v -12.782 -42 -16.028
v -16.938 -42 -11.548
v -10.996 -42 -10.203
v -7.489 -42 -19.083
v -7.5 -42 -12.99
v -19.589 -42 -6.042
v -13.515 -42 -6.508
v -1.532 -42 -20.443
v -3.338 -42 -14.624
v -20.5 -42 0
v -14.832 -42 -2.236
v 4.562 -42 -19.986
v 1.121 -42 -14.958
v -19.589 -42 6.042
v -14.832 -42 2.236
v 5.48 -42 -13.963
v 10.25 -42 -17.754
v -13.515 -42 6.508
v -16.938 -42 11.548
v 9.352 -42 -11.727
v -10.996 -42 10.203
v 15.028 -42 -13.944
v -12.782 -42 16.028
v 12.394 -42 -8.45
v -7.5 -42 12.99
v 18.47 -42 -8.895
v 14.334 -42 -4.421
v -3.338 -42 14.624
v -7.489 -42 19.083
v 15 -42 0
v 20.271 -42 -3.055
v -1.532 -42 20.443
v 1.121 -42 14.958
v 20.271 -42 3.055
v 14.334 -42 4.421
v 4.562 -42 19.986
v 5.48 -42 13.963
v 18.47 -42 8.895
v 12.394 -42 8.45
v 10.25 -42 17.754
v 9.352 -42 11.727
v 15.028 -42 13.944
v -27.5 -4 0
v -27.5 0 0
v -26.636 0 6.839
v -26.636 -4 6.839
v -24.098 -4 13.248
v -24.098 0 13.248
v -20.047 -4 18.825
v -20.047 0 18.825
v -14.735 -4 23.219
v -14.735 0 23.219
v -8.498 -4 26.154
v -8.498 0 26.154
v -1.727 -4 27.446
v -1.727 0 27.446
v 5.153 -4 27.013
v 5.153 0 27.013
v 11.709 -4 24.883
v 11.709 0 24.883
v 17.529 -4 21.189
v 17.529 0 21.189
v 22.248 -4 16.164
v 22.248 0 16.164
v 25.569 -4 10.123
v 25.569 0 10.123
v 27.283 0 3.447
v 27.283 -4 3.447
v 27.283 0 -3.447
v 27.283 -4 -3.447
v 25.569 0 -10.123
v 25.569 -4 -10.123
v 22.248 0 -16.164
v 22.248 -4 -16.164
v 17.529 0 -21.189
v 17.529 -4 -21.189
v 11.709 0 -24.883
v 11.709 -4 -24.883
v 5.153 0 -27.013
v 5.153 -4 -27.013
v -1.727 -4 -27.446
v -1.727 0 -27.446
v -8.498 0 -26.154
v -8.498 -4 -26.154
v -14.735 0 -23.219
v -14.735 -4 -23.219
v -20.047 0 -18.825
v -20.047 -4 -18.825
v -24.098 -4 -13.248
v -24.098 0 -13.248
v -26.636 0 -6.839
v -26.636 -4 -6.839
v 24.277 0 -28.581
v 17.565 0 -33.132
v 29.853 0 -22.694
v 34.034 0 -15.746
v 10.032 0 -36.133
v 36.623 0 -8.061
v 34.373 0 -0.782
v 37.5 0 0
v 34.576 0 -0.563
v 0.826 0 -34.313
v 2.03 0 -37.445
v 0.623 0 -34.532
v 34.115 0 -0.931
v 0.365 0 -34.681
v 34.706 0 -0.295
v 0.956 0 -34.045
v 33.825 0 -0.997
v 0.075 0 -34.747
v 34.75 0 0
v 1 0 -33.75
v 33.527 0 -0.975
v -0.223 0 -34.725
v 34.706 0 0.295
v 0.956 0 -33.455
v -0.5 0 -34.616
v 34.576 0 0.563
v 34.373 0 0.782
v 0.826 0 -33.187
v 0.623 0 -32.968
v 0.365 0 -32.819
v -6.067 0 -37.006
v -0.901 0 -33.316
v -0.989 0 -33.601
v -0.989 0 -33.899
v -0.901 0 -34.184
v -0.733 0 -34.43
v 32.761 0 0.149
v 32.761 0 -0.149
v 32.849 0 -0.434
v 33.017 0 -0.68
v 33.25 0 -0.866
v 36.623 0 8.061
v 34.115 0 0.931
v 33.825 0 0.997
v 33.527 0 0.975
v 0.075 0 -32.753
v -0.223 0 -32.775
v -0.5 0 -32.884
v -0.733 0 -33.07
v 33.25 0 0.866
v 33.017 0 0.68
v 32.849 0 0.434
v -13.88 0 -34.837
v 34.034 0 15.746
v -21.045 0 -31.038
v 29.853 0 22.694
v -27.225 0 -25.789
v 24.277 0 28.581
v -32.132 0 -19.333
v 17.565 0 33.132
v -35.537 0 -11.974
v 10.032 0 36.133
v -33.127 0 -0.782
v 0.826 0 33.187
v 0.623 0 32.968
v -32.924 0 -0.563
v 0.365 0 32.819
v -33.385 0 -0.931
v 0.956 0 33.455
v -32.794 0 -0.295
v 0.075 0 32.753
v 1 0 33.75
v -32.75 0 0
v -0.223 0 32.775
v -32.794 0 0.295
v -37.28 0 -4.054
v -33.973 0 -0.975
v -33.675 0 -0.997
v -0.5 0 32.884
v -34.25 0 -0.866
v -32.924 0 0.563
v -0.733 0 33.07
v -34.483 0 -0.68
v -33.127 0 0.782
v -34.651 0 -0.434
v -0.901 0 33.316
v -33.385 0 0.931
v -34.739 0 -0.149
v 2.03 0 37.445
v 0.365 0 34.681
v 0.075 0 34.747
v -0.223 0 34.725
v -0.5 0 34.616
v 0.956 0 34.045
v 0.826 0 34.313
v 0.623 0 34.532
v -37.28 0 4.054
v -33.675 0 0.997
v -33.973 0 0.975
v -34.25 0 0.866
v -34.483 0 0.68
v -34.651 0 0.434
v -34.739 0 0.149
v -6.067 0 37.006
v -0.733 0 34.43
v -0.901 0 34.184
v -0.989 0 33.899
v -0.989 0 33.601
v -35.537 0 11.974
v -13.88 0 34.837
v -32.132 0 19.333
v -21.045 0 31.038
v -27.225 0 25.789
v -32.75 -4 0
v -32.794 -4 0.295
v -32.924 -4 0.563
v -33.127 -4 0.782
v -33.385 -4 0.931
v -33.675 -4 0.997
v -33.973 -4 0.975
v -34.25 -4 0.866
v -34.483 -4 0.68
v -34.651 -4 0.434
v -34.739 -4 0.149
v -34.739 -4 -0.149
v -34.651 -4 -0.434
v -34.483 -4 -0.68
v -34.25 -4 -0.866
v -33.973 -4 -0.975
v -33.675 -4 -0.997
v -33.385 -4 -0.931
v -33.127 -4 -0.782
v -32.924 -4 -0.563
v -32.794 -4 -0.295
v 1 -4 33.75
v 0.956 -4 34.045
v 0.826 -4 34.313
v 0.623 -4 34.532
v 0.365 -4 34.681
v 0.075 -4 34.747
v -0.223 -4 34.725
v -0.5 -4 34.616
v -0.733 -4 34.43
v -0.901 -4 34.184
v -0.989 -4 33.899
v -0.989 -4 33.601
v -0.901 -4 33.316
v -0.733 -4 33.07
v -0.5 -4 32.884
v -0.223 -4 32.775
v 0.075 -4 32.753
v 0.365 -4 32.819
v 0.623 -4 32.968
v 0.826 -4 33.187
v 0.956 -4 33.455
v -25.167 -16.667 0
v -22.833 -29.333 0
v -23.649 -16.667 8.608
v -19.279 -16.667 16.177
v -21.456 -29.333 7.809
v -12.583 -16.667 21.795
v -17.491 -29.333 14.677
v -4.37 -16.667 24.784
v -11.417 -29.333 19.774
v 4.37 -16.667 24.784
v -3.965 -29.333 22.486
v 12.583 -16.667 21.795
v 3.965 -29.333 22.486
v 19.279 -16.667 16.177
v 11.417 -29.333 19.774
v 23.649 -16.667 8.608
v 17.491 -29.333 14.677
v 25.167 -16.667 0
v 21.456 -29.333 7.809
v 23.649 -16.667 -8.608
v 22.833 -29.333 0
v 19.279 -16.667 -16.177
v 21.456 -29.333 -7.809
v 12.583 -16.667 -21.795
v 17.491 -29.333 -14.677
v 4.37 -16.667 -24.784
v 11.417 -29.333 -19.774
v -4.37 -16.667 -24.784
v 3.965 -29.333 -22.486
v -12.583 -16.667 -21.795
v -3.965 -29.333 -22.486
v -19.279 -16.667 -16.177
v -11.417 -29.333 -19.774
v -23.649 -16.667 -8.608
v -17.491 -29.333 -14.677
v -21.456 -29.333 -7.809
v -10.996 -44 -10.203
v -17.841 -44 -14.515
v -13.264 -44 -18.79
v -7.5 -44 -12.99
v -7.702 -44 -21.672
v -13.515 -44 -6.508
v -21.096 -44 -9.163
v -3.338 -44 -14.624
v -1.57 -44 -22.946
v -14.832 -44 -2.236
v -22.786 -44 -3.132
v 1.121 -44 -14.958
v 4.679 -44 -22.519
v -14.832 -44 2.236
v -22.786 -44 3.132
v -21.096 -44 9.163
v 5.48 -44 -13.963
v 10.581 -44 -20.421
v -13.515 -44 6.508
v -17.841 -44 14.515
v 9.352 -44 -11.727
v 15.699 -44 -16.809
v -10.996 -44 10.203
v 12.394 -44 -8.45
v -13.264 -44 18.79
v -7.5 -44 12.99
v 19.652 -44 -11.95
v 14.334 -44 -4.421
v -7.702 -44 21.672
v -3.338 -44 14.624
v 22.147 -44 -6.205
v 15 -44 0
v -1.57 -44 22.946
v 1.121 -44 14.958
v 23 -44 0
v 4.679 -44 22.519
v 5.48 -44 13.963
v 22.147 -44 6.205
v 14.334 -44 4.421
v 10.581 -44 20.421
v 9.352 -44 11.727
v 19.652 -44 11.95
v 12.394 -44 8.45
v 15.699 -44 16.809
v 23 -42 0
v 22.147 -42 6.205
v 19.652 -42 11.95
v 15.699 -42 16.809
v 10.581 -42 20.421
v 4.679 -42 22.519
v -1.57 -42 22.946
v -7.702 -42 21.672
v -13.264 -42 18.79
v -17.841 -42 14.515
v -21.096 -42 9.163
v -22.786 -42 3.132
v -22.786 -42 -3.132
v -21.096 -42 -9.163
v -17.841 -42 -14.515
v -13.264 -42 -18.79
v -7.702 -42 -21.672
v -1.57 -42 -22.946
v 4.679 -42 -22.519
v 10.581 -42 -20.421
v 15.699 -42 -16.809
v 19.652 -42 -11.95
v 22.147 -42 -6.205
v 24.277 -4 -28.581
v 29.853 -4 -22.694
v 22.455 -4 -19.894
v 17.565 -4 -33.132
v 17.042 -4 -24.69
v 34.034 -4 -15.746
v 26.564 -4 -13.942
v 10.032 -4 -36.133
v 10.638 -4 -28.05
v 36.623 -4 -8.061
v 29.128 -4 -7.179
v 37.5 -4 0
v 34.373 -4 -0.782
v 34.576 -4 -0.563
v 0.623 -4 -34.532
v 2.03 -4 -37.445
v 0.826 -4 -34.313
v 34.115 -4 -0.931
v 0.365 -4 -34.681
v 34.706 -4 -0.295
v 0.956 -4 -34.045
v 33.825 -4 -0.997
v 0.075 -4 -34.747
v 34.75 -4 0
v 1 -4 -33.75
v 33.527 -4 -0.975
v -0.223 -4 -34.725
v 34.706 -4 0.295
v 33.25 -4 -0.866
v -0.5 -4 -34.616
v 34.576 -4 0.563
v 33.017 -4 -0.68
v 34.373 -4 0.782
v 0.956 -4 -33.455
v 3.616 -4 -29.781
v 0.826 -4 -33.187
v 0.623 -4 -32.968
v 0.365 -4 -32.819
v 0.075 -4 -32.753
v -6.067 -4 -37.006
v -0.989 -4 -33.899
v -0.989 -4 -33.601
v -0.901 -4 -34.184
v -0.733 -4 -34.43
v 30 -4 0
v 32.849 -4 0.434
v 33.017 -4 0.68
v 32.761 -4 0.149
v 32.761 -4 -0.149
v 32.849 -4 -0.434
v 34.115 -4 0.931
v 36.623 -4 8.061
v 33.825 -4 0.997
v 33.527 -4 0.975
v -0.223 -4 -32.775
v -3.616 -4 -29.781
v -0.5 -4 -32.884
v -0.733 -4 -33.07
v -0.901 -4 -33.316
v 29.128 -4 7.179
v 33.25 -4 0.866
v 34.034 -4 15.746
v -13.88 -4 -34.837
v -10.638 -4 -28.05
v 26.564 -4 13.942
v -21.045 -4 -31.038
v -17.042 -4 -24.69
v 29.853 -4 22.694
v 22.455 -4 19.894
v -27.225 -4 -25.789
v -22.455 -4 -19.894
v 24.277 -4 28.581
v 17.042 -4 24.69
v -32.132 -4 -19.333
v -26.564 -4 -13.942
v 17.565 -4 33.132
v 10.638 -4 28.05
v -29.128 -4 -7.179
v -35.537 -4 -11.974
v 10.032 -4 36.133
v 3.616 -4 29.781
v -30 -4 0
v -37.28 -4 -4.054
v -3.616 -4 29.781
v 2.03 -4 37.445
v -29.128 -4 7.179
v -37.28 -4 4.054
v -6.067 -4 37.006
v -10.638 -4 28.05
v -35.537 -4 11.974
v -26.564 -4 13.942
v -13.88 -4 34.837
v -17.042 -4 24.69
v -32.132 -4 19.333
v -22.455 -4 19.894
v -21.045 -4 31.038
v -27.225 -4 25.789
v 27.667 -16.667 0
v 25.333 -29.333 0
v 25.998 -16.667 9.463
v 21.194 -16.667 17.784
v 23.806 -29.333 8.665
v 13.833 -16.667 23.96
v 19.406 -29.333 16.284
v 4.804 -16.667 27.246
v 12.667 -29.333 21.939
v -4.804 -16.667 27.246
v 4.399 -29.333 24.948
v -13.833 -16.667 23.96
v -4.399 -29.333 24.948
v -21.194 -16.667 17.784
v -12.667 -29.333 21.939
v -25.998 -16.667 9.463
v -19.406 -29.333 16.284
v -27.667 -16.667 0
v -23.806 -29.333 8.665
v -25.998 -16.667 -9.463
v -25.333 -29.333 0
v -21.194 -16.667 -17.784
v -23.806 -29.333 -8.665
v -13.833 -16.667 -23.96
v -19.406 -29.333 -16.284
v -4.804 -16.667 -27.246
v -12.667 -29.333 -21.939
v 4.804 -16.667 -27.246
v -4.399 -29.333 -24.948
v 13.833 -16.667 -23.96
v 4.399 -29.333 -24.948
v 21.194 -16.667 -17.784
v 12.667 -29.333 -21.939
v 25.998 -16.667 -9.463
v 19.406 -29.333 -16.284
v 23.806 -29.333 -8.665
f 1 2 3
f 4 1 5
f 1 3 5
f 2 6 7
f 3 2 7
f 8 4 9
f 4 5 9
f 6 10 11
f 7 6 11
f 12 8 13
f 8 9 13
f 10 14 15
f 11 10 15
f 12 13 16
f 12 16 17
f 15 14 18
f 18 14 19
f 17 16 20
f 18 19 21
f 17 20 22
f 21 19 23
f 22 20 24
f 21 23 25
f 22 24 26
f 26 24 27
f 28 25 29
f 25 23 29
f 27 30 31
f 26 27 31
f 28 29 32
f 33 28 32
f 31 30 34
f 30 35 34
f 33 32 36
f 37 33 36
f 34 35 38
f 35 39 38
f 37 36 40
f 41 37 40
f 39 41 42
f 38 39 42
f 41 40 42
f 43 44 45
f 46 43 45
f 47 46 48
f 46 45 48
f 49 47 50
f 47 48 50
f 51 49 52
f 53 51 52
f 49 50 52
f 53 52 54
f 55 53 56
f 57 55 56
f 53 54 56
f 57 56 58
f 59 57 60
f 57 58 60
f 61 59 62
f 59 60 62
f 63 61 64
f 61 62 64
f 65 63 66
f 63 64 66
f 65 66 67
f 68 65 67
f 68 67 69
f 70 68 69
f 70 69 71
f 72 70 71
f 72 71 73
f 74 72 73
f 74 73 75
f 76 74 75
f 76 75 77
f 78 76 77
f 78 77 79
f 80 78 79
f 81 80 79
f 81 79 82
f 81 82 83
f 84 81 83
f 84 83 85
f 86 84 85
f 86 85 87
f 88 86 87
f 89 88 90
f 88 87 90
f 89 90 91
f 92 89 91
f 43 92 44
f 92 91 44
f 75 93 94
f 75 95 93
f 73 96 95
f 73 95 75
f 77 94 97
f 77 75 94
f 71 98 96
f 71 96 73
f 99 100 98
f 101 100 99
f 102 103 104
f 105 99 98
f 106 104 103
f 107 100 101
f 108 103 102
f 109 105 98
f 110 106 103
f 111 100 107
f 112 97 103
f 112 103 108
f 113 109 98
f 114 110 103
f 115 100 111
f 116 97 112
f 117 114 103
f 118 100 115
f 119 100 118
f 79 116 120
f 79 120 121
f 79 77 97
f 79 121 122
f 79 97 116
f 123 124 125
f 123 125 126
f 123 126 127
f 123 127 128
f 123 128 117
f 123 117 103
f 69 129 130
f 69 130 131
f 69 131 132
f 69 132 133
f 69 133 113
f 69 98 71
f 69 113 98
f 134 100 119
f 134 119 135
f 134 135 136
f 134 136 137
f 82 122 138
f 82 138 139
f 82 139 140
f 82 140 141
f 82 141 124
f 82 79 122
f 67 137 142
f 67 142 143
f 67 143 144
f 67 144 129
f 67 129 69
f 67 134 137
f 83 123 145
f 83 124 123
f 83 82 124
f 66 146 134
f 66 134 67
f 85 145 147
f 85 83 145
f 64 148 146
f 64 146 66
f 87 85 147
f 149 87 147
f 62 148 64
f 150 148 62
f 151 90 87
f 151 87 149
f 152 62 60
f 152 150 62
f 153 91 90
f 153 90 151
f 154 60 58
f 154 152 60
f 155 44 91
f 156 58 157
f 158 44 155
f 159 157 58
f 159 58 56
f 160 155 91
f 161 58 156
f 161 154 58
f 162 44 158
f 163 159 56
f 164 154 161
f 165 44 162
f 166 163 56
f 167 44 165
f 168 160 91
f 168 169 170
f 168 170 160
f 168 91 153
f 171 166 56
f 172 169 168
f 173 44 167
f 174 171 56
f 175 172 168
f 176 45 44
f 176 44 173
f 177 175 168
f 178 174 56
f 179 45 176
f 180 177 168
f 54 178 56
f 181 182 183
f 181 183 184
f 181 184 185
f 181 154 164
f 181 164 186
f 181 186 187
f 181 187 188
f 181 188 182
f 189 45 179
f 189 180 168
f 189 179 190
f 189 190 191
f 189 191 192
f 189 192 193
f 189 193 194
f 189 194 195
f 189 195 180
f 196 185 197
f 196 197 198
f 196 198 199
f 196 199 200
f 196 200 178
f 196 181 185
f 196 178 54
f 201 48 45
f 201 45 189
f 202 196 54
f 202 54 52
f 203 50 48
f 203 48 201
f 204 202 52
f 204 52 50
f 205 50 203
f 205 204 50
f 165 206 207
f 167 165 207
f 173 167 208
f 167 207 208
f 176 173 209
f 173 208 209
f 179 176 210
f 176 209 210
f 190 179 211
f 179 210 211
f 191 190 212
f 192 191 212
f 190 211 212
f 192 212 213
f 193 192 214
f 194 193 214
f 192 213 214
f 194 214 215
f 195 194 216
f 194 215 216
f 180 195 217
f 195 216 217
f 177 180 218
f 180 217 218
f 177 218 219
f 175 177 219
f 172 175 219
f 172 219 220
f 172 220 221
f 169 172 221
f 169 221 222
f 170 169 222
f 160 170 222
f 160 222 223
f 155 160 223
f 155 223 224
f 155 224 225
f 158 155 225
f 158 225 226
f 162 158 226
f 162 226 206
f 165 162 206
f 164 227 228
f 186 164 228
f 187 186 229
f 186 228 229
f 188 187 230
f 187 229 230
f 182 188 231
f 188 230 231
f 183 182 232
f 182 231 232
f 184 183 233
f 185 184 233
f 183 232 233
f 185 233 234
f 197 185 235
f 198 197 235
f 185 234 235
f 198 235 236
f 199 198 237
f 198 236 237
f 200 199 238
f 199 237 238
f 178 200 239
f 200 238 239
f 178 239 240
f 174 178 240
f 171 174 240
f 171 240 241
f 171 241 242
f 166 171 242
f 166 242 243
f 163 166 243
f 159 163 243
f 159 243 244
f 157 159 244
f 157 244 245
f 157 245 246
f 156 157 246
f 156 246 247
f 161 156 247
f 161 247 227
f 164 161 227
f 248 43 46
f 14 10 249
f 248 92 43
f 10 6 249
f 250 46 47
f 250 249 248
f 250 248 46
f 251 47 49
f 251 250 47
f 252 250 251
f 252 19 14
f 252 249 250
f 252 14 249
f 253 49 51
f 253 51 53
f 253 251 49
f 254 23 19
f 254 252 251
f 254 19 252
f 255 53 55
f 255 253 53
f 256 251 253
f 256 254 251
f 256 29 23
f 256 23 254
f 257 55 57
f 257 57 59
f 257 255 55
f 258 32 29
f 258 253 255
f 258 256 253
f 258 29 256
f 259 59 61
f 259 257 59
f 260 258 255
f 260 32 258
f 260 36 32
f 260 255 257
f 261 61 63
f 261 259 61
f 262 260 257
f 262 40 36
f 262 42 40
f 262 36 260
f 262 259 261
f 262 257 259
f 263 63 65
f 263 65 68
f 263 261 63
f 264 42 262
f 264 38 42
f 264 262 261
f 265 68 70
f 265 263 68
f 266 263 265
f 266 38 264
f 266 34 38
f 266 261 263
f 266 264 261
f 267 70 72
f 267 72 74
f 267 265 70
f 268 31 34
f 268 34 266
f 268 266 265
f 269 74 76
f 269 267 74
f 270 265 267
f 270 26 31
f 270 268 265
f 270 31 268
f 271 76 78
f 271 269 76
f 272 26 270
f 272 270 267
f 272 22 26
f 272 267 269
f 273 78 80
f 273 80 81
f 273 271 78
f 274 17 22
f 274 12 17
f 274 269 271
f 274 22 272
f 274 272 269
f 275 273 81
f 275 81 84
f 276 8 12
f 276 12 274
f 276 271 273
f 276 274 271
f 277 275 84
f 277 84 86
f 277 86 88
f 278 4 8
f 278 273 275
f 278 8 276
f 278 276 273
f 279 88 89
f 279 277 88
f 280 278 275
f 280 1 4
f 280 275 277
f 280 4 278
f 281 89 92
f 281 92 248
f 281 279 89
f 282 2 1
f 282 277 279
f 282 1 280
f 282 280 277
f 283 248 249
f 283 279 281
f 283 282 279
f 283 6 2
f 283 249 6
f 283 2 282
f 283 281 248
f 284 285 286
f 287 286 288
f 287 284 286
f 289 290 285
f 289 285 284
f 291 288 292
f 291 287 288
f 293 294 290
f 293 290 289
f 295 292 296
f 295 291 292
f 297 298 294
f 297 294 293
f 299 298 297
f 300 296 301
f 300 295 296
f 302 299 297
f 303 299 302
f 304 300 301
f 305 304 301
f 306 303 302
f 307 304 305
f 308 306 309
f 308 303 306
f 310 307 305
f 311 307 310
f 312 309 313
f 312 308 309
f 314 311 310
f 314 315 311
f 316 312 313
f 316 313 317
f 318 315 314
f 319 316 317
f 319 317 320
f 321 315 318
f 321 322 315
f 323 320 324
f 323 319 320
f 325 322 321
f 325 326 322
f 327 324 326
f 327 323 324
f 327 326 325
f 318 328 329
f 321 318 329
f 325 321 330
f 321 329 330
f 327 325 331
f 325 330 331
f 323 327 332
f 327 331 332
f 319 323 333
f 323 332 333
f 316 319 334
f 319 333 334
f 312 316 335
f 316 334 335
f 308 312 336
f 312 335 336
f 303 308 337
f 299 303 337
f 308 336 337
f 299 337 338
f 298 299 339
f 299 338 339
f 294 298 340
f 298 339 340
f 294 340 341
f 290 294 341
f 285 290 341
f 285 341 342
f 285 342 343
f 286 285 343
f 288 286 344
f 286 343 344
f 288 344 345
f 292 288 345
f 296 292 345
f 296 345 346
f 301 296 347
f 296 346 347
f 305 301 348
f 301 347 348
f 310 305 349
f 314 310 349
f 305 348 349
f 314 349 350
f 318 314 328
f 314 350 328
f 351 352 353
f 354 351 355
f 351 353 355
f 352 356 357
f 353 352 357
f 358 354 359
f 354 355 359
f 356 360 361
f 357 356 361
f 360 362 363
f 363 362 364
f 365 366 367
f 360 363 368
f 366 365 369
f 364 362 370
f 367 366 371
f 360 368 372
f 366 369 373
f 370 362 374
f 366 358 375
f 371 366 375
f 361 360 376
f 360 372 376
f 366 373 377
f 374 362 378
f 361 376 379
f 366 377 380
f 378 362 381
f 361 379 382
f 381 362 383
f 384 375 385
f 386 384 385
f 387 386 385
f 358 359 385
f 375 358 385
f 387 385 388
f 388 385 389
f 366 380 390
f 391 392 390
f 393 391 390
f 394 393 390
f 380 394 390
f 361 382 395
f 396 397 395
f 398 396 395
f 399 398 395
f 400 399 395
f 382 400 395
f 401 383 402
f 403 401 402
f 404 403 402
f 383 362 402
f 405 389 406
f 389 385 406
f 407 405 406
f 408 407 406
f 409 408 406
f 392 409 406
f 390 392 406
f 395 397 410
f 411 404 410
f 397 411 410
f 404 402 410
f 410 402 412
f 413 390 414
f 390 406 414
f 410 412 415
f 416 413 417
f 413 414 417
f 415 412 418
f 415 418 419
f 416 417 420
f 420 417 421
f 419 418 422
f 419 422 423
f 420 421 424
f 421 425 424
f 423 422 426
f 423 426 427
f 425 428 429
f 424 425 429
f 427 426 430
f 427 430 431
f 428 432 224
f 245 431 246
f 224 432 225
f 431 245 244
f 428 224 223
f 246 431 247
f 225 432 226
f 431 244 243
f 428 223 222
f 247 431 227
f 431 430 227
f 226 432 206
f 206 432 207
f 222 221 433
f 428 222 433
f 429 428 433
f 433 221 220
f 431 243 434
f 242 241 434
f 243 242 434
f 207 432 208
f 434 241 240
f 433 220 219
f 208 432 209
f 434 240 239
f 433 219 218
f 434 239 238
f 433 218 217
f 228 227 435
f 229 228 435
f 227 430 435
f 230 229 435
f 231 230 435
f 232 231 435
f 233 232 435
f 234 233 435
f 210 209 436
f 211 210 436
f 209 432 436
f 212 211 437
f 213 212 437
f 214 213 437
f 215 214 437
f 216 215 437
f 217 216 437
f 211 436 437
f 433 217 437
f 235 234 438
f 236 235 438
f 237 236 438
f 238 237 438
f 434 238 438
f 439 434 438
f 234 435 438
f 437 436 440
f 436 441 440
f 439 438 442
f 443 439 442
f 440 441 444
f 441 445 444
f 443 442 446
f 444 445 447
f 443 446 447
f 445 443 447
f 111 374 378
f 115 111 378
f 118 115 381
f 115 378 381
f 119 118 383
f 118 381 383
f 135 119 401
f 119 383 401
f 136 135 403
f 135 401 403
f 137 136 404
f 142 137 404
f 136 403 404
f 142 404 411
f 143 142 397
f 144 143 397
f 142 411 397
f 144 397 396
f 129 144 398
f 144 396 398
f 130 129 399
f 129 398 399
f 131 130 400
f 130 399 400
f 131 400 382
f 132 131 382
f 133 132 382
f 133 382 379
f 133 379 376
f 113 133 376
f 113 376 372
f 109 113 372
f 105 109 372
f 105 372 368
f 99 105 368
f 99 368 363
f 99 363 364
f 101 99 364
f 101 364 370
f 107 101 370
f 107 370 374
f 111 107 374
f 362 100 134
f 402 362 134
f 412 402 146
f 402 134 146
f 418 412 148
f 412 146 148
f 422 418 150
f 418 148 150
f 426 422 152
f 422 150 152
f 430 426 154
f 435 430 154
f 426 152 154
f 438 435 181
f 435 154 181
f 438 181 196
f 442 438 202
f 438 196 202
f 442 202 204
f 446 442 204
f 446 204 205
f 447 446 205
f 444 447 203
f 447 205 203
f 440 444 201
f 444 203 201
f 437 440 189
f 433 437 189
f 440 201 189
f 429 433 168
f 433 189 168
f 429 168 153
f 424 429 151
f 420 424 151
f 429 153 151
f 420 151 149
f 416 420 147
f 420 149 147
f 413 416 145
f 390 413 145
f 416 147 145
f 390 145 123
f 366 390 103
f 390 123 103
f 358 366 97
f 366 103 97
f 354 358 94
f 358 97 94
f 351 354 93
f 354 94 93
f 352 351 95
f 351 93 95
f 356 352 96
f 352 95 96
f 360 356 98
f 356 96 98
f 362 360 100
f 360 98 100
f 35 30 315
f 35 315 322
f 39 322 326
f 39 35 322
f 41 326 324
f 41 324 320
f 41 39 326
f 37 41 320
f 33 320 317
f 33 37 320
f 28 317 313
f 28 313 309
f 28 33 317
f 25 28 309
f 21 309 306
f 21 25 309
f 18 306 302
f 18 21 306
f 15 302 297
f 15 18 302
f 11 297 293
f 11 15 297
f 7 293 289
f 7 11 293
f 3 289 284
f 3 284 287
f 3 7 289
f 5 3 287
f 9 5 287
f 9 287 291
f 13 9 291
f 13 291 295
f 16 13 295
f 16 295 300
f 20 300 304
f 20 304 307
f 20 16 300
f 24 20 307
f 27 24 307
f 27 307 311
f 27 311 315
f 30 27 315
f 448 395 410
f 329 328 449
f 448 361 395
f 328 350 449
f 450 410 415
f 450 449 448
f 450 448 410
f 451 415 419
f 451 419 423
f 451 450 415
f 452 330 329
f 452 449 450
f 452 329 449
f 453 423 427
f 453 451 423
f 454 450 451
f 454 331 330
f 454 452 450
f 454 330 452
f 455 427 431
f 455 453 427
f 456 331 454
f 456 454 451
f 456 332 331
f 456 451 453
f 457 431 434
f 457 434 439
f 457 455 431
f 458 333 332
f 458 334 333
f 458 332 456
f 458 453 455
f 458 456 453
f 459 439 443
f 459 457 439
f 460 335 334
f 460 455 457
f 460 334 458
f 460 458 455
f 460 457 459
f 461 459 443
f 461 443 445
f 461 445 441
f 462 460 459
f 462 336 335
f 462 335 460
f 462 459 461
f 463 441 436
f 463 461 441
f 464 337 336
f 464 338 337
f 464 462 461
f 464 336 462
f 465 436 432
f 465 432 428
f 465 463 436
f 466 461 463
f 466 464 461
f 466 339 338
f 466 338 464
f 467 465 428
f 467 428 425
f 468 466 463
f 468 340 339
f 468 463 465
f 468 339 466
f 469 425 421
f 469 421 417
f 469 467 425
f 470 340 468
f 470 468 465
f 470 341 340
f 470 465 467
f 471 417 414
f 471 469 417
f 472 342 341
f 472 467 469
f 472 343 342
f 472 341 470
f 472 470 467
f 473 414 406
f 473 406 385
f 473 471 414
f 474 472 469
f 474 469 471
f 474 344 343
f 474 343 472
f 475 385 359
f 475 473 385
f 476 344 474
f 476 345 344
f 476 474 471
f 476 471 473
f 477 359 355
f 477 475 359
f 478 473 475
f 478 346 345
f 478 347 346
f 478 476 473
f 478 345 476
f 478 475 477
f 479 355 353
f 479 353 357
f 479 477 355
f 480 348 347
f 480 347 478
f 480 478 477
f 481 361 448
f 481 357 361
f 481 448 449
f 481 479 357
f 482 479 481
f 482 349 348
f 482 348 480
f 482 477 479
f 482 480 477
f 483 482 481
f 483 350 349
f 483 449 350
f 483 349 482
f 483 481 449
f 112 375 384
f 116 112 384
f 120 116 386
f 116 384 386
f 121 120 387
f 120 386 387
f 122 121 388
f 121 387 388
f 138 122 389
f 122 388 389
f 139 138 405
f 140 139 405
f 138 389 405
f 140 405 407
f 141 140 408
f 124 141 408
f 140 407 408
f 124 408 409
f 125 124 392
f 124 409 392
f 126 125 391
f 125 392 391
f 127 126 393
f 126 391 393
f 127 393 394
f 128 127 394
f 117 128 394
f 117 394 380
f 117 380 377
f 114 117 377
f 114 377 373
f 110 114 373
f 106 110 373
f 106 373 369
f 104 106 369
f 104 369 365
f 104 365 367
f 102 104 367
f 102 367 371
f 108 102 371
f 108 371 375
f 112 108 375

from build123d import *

# Parameters (mm, degrees)
F0_R      = 37.5
F0_R_2    = 30
F1_DEPTH  = 4
F2_R      = 1
F3_DEPTH  = 25
F4_R      = 30
F4_R_2    = 27.5
F5_DEPTH  = 4
F6_R      = 30
F8_R      = 23
F11_R     = 27.5
F10_R     = 20.5
F13_R     = 23
F13_R_2   = 15
F14_DEPTH = 2


with BuildPart() as f1:
    # F0 (on Front) → F1 (new body)
    with BuildSketch(Plane.XZ):
        Circle(F0_R)
        Circle(F0_R_2, mode=Mode.SUBTRACT)
    extrude(amount=F1_DEPTH)

    # F2 (on face) → F3 (cut)
    with BuildSketch(Plane.XZ.offset(4)):
        with Locations((0, 33.75)):
            Circle(F2_R)
        with Locations((-33.75, 0)):
            Circle(F2_R)
        with Locations((33.75, 0)):
            Circle(F2_R)
        with Locations((0, -33.75)):
            Circle(F2_R)
    extrude(amount=-F3_DEPTH, mode=Mode.SUBTRACT)

    # F4 (on face) → F5 (join)
    with BuildSketch(Plane(origin=(0, 0, 0), x_dir=(-1, 0, 0), z_dir=(0, 1, 0))):
        Circle(F4_R)
        Circle(F4_R_2, mode=Mode.SUBTRACT)
    extrude(amount=-F5_DEPTH)

    # F6 (on face) → F9 section 0
    with BuildSketch(Plane.XZ.offset(4)):
        Circle(F6_R)
    # F8 (on offset) → F9 section 1
    with BuildSketch(Plane.XZ.offset(42)):
        Circle(F8_R)
    loft()

    # F11 (on face) → F12 section 0
    with BuildSketch(Plane(origin=(0, -4, 0), x_dir=(-1, 0, 0), z_dir=(0, 1, 0))):
        Circle(F11_R)
    # F10 (on face) → F12 section 1
    with BuildSketch(Plane.XZ.offset(42)):
        Circle(F10_R)
    loft(mode=Mode.SUBTRACT)

    # F13 (on face) → F14 (join)
    with BuildSketch(Plane.XZ.offset(42)):
        Circle(F13_R)
        Circle(F13_R_2, mode=Mode.SUBTRACT)
    extrude(amount=F14_DEPTH)


solid = f1.part
